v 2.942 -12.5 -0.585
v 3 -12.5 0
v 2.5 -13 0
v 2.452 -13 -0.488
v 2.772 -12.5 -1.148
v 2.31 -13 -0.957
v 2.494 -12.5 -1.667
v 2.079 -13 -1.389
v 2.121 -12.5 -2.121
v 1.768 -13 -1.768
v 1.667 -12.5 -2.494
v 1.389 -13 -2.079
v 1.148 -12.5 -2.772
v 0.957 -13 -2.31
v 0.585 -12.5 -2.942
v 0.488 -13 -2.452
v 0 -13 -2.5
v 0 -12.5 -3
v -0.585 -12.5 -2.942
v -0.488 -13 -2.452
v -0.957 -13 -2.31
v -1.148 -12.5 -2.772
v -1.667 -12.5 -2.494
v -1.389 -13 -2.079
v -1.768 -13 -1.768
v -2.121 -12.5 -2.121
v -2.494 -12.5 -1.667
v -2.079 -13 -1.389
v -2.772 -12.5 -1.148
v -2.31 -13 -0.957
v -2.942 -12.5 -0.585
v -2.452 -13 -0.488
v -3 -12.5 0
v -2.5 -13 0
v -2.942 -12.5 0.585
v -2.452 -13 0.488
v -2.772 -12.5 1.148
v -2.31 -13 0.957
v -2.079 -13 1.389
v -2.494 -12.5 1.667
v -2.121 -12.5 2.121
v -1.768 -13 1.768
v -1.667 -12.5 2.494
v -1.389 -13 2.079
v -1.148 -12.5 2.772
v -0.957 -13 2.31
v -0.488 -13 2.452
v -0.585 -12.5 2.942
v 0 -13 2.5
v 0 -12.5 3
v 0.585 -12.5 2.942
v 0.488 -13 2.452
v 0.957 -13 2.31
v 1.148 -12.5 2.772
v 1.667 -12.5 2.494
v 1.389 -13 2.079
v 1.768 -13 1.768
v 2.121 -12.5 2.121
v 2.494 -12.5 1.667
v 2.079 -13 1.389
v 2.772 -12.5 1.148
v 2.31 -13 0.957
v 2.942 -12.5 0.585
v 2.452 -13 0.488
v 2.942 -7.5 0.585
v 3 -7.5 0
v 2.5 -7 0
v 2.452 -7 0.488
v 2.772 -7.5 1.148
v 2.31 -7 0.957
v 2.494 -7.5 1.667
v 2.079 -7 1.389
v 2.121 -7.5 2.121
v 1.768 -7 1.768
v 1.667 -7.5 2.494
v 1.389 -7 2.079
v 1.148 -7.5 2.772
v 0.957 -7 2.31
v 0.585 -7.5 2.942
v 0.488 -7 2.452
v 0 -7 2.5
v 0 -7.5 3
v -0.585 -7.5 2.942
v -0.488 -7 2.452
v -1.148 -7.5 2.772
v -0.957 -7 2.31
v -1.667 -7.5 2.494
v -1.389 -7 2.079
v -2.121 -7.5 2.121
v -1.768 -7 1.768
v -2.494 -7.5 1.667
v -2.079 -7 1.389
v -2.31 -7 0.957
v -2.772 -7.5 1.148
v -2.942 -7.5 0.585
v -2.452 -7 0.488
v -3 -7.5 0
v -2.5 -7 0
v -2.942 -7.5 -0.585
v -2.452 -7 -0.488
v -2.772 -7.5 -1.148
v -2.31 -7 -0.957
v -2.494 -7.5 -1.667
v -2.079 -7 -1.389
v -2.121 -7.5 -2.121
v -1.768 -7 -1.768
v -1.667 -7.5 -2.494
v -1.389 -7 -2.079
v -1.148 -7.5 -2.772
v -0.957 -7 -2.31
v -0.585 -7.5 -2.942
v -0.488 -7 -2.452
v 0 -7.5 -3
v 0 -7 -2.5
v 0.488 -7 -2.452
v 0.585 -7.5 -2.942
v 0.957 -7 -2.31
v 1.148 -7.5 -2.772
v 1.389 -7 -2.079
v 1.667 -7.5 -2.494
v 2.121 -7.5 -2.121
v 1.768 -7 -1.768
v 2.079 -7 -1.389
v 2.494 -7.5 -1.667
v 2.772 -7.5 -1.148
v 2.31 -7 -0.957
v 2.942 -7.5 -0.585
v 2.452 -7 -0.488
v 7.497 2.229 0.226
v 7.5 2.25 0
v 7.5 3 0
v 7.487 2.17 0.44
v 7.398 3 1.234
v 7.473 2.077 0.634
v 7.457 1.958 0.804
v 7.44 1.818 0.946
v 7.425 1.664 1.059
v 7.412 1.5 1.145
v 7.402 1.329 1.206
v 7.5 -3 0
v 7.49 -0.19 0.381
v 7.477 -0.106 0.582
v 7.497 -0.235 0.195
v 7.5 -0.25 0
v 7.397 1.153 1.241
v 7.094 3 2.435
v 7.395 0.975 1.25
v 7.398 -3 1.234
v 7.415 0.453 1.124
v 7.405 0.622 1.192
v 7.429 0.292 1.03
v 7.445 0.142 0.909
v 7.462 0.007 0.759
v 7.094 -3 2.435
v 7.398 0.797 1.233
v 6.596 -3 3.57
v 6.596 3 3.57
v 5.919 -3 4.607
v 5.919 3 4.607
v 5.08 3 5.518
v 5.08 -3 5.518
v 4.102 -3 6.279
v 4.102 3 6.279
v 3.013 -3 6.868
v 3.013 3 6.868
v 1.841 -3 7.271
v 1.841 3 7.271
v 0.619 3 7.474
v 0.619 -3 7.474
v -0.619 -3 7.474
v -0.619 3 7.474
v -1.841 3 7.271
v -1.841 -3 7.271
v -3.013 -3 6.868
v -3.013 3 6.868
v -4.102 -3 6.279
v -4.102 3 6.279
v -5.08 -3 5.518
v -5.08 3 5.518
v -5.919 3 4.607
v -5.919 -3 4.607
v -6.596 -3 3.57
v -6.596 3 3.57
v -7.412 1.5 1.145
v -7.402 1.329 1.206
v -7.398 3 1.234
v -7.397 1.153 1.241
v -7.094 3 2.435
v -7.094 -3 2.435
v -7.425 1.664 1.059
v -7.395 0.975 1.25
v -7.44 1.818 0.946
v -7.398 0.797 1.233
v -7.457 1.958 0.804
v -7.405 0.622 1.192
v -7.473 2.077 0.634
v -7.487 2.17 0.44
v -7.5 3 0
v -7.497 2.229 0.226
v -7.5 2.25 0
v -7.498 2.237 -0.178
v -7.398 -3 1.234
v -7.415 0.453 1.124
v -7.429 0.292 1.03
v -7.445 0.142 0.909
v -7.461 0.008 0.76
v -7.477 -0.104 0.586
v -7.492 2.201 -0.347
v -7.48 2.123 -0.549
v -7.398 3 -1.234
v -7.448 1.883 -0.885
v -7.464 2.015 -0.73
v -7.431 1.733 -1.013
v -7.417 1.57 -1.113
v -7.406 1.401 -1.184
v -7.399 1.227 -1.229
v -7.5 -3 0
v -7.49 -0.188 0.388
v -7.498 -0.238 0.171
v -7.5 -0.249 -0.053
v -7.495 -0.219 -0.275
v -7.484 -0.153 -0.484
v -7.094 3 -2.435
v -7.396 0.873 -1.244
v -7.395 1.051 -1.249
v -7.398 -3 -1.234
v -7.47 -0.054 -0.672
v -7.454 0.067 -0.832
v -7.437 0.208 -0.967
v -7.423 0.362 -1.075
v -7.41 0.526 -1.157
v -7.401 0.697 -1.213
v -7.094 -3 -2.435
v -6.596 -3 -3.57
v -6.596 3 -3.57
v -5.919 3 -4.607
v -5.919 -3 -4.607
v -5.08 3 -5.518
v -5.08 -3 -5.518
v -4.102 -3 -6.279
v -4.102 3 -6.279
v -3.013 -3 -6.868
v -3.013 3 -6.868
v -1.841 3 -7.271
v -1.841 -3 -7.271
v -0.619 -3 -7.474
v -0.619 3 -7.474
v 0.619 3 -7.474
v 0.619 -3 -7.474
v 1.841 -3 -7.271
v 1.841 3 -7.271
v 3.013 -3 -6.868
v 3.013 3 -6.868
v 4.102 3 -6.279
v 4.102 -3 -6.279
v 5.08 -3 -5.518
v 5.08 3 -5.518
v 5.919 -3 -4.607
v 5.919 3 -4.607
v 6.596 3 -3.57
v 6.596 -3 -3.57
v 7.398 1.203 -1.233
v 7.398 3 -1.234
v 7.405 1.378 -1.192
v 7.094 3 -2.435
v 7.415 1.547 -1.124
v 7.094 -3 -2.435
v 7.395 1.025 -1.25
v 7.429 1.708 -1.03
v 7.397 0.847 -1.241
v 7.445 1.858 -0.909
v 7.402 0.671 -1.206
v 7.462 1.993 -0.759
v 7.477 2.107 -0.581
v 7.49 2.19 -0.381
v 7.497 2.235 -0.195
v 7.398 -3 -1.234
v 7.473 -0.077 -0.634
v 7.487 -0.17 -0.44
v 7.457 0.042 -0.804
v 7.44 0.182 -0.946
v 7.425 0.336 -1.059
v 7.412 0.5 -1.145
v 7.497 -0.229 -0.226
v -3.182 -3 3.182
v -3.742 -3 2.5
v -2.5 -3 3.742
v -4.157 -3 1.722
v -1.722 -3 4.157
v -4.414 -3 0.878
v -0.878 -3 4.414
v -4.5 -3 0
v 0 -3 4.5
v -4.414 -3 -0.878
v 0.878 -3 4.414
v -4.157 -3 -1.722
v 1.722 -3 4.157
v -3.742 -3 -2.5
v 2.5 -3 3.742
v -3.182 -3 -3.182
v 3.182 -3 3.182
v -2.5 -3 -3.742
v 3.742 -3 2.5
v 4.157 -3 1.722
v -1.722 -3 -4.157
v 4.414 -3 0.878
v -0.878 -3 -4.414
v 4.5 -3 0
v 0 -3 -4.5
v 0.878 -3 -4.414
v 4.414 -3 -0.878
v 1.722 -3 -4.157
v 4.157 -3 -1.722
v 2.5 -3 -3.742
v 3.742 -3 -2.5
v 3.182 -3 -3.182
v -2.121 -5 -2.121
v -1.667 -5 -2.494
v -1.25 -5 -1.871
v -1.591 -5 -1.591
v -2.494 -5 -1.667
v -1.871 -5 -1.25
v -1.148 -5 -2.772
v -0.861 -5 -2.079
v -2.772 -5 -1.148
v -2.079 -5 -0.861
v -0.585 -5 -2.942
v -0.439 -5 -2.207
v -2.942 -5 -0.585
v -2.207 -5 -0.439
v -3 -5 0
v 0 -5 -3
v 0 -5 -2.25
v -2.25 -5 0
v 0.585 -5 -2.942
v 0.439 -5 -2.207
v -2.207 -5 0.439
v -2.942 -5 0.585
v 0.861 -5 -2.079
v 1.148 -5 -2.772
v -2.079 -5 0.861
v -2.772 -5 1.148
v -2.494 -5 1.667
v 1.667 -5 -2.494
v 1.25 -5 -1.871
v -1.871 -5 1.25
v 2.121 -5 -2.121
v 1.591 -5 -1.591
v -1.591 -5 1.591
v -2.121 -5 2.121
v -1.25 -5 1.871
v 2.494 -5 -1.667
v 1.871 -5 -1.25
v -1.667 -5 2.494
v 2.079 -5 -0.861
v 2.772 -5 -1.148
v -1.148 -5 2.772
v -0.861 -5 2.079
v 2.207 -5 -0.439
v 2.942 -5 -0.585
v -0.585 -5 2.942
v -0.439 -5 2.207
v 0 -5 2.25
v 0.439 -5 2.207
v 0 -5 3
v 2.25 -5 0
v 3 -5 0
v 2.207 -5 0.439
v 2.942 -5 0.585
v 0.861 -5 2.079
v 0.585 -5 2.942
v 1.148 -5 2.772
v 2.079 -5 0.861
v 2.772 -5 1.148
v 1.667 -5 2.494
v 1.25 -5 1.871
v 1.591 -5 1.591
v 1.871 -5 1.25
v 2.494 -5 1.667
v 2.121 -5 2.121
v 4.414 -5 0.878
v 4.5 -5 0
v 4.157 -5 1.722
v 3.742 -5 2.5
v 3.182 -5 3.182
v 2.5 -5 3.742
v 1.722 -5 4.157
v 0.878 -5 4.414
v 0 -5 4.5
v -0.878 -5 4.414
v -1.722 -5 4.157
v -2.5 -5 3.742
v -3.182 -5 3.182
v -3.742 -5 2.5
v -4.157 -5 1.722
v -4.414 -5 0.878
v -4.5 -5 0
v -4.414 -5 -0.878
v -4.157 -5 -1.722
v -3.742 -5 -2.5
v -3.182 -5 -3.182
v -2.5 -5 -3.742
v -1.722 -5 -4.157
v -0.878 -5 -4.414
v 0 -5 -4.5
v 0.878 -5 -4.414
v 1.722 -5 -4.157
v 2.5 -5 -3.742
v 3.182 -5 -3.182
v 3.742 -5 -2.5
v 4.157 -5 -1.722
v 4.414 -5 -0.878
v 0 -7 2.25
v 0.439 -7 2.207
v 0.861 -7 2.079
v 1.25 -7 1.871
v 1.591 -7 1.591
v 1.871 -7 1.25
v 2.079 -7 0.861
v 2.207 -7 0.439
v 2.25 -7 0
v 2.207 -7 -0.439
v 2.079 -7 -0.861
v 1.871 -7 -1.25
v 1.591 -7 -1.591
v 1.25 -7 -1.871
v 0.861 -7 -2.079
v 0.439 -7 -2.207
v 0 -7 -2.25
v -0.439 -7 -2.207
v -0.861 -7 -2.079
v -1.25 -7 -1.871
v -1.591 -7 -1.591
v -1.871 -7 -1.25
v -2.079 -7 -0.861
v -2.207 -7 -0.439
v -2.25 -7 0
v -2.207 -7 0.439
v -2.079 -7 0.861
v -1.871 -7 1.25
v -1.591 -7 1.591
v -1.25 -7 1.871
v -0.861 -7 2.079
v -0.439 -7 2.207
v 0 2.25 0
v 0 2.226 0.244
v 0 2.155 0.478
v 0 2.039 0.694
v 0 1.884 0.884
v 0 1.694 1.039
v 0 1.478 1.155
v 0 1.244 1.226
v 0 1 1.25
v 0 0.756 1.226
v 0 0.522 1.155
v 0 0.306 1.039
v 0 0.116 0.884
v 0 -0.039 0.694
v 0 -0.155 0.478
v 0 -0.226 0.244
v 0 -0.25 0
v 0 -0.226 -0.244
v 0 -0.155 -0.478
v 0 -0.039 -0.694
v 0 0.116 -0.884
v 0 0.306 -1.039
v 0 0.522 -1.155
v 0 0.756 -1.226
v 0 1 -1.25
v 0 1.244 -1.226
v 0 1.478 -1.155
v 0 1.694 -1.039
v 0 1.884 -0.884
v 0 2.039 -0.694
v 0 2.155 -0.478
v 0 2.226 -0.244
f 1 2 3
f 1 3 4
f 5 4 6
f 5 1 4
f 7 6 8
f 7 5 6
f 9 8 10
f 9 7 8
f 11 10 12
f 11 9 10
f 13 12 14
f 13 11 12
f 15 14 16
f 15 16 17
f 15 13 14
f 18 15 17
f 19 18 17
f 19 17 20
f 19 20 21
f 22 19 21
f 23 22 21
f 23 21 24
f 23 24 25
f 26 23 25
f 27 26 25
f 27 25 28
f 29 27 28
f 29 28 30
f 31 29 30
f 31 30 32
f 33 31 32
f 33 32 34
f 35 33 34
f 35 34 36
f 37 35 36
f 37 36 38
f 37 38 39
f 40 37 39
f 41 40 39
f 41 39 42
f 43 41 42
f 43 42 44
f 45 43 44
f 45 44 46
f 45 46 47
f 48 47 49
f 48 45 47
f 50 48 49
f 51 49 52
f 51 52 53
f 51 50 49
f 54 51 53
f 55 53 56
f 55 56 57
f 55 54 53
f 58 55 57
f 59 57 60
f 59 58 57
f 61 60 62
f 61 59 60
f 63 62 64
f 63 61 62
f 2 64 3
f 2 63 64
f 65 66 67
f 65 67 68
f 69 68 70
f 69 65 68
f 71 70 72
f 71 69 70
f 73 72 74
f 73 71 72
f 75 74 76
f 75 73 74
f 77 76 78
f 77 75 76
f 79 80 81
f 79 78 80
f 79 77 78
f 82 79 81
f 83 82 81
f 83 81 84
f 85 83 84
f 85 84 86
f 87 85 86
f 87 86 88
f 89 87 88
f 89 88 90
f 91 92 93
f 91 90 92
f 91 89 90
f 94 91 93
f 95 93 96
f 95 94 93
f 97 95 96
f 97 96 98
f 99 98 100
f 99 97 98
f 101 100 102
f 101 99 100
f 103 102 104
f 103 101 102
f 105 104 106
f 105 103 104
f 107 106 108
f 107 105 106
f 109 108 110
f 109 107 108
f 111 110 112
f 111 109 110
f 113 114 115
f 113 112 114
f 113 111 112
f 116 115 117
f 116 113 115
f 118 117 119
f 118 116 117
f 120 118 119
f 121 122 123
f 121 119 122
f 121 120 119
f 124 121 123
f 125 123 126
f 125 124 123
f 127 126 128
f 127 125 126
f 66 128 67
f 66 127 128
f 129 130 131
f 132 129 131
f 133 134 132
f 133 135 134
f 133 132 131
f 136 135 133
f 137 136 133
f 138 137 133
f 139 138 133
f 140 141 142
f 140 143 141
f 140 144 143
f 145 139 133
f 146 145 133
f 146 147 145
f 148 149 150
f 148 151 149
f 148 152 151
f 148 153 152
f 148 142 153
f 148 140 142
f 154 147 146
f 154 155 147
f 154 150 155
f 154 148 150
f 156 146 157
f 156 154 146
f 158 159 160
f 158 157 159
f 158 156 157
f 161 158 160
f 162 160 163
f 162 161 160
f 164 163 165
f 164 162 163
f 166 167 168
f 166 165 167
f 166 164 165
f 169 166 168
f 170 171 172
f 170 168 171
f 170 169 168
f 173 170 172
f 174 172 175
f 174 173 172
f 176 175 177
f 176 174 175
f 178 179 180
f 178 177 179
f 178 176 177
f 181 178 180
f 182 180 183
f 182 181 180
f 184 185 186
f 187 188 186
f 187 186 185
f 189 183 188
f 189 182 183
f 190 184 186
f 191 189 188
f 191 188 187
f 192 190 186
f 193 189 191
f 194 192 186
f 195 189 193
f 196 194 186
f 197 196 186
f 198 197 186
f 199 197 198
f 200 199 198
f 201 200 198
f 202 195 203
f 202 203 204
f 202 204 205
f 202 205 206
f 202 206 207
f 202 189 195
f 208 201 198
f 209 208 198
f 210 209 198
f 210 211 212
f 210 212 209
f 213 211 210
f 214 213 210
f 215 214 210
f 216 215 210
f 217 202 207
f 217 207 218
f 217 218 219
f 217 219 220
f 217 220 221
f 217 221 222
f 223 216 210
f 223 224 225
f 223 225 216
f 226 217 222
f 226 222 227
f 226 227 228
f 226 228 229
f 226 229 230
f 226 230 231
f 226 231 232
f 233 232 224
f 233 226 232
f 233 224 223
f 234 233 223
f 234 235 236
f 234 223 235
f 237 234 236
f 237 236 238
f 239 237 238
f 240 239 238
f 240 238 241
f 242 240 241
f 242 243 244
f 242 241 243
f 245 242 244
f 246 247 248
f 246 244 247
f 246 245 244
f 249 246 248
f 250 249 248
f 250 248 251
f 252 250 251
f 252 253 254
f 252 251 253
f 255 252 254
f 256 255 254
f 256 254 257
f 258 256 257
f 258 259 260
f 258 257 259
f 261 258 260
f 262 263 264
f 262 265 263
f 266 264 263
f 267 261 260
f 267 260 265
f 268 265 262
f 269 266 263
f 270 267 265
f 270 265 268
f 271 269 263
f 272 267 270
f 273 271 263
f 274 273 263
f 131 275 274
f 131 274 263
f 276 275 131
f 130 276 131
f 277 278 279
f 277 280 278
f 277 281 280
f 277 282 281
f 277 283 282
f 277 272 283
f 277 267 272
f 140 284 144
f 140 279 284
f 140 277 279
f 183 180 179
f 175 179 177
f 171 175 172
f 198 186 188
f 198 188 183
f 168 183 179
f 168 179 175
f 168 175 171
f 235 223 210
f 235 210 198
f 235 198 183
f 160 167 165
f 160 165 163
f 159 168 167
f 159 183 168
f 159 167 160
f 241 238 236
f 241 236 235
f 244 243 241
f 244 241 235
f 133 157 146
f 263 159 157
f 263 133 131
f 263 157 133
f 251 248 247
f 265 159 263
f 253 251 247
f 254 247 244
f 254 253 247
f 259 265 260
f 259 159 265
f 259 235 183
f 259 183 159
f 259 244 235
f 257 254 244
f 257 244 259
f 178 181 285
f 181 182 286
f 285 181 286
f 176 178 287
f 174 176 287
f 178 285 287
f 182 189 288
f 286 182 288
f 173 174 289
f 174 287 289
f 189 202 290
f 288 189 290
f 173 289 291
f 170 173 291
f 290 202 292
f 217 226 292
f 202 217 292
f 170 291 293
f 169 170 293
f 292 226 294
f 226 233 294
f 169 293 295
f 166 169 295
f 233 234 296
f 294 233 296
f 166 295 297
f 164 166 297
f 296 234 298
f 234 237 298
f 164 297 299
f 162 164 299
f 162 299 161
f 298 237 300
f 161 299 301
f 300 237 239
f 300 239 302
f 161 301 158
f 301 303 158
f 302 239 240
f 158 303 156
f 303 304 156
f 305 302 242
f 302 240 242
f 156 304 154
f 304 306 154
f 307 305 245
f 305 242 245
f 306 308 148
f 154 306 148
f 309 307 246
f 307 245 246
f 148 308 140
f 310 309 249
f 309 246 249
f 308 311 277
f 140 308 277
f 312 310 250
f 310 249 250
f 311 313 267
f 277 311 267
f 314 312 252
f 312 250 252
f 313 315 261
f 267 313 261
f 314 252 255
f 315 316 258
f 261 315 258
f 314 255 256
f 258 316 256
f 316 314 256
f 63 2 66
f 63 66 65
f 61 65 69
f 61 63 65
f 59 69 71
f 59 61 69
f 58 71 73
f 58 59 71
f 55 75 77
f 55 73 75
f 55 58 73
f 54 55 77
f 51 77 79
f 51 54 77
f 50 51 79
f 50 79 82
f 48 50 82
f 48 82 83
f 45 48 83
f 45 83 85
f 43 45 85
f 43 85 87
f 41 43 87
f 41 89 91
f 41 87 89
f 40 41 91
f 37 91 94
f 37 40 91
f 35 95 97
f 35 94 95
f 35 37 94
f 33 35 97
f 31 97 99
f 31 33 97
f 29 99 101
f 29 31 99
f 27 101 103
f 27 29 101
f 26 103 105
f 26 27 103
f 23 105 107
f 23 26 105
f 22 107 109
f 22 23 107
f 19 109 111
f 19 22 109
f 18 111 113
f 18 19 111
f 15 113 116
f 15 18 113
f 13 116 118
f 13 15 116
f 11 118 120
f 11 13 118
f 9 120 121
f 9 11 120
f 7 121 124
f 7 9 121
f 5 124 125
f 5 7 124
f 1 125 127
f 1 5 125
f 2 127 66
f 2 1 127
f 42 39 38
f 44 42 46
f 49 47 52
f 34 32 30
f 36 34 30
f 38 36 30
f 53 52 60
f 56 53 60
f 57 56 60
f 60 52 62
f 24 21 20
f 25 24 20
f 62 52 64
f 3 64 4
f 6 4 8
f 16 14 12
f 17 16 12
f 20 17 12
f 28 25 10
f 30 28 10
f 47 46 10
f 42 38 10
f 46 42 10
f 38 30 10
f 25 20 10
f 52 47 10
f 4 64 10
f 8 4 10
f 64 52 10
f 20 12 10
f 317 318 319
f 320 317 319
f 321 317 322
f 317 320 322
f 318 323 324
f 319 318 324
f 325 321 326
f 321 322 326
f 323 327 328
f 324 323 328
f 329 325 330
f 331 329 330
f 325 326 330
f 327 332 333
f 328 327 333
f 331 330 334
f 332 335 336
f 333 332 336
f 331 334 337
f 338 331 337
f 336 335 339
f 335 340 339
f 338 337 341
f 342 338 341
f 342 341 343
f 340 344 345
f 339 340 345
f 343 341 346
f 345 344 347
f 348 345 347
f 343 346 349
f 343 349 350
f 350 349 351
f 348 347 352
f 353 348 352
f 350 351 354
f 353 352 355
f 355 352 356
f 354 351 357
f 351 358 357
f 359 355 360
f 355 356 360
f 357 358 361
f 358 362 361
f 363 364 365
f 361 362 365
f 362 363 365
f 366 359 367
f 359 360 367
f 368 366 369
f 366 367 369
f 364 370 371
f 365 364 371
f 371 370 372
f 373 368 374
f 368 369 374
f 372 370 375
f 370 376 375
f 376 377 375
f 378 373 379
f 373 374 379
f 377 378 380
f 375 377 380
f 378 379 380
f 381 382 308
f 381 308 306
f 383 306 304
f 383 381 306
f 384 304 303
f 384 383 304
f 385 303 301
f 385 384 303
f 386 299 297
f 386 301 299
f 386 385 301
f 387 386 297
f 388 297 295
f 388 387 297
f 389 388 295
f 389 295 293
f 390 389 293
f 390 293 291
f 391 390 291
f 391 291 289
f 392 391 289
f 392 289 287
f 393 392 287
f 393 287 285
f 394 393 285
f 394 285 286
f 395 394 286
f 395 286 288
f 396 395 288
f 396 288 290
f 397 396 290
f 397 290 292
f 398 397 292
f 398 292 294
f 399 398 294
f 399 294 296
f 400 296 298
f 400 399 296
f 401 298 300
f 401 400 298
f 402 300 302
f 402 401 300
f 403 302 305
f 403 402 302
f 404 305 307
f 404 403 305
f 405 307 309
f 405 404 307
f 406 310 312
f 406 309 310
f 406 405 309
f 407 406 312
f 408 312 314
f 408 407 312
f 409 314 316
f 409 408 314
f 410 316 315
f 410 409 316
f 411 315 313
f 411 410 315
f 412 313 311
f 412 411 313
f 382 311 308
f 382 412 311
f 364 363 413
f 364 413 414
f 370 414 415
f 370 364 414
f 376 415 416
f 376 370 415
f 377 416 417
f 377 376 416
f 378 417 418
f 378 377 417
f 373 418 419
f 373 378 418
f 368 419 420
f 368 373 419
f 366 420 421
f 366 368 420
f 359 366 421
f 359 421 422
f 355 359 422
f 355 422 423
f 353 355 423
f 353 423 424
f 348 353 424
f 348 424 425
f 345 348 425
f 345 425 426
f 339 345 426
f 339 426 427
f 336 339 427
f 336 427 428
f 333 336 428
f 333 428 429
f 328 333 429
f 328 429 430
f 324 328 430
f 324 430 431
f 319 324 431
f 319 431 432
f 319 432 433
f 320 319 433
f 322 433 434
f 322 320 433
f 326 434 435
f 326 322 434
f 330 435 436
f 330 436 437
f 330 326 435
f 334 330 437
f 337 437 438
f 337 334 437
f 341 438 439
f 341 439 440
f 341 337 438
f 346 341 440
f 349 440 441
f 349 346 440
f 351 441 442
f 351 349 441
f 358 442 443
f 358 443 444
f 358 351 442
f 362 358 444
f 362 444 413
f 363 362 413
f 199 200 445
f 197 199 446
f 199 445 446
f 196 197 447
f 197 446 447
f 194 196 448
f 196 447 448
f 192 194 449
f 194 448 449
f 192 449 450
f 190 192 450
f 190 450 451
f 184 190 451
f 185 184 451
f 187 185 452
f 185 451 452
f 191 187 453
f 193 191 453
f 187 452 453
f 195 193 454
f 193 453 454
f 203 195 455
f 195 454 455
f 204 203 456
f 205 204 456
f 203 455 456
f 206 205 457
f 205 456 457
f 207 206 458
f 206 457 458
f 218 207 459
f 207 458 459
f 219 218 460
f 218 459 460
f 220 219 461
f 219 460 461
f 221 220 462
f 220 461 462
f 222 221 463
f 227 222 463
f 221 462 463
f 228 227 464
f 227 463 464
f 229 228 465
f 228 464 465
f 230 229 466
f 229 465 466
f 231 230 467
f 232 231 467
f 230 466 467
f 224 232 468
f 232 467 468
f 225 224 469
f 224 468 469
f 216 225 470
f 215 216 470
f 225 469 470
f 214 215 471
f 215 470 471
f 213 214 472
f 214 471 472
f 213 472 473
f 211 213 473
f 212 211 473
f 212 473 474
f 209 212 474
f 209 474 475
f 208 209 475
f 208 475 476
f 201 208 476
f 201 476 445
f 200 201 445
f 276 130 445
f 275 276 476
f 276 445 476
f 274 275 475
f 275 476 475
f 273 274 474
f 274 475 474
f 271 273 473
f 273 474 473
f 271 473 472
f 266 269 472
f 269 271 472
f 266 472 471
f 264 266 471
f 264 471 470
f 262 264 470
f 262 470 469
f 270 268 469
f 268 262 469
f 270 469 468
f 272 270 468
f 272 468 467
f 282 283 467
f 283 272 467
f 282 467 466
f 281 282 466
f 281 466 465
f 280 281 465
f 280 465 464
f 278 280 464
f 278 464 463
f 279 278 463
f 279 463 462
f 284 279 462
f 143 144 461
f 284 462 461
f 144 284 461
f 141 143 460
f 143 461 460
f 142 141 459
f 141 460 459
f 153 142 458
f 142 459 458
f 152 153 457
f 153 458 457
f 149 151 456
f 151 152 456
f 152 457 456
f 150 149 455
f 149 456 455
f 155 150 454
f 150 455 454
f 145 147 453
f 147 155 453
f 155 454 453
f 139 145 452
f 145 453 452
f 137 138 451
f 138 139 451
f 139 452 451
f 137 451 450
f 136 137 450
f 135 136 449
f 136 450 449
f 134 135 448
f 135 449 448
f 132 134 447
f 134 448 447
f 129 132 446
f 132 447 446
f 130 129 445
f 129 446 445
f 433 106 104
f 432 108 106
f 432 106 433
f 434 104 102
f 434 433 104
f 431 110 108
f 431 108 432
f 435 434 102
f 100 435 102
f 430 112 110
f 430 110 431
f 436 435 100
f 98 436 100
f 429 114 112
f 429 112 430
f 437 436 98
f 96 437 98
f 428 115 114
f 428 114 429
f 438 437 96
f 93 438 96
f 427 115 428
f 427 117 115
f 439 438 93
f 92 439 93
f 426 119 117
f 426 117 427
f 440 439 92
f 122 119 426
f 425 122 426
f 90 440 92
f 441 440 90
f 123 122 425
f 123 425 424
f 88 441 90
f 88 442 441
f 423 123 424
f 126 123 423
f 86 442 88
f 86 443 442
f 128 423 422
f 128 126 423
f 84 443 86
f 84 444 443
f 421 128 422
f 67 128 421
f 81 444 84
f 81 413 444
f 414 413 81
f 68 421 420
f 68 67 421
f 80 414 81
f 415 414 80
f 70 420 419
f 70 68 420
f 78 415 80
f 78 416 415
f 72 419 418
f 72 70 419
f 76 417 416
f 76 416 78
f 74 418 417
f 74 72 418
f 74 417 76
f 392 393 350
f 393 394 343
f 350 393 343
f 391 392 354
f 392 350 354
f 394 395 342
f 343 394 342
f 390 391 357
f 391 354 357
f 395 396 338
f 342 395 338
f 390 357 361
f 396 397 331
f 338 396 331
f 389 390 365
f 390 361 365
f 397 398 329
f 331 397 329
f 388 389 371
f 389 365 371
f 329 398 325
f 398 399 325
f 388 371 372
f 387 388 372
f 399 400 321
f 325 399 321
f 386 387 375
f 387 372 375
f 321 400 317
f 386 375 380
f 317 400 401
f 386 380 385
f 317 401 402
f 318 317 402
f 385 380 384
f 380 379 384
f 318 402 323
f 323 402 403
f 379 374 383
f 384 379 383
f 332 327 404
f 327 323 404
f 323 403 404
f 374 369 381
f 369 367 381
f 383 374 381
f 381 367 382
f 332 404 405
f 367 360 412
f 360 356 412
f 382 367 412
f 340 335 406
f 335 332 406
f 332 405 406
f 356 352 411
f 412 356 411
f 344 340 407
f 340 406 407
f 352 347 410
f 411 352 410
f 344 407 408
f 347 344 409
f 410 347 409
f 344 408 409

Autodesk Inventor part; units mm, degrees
ref_plane "YZ Plane" through (0, 0, 0) normal (1, 0, 0) x (0, 1, 0)
ref_plane "XZ Plane" through (0, 0, 0) normal (0, 1, 0) x (-1, 0, 0)
ref_plane "XY Plane" through (0, 0, 0) normal (0, 0, 1) x (1, 0, 0)
sketch "Sketch3" plane through (0, 0, 0) normal (0, 0, 1) x (1, 0, 0)
  line L0 (0, 3) -> (7.5, 3)
  line L1 (7.5, 3) -> (7.5, -3)
  line L2 (7.5, -3) -> (4.5, -3)
  line L3 (4.5, -3) -> (4.5, -5)
  line L4 (4.5, -5) -> (3, -5)
  line L5 (0, -16.2) -> (0, 6.2) projected
  line L6 (3, -5) -> (3, -13)
  line L7 (3, -13) -> (0, -13)
  point P0 (0, 0)
  point P1 (7.5, 0)
  dimension "d6" = 6
  dimension "d7" = 15
  dimension "d8" = 9
  dimension "d9" = 2
  dimension "d11" = 6
  dimension "d12" = 8
revolve "Revolution1" add sketch "Sketch3" angle 360 about axis through (0, -10, 0) along (0, 1, 0)
sketch "Sketch4" plane through (0, 0, 0) normal (1, 0, 0) x (0, 1, 0)
  circle A0 centre (1, 0) radius 1.25
  line L0 (3, 7.5) -> (3, -7.5) projected
  point P0 (0, 0)
  dimension "d13" = 2.5
  dimension "d14" = 2
extrude "Extrusion3" cut sketch "Sketch4" along normal through all both and the other way through all
sketch "Sketch5" plane through (0, 0, 0) normal (1, 0, 0) x (0, 1, 0)
  line L0 (-7, 2.25) -> (-5, 2.25)
  line L1 (-5, 2.25) -> (-5, 3)
  line L2 (-5, 3) -> (-7, 3)
  line L3 (-7, 3) -> (-7, 2.25)
  line L4 (-5, 3) -> (-13, 3) projected
  line L5 (-5, 4.5) -> (-5, -4.5) projected
  line L6 (-16.2, 0) -> (6.2, 0) projected
  point P0 (0, 0)
  dimension "d17" = 2
  dimension "d18" = 4.5
revolve "Revolution2" cut sketch "Sketch5" angle 360 about axis through (0, -10, 0) along (0, 1, 0)
thread "Thread1" size "M6x1" class "6g" standard "ANSI Metric M Profile" full length
chamfer "Chamfer1" distance 0.5 angle 45 2 edges at (-3, -13, 0) (-3, -7, 0)
properties part number "Thumb Screw" material "Steel, Mild"
